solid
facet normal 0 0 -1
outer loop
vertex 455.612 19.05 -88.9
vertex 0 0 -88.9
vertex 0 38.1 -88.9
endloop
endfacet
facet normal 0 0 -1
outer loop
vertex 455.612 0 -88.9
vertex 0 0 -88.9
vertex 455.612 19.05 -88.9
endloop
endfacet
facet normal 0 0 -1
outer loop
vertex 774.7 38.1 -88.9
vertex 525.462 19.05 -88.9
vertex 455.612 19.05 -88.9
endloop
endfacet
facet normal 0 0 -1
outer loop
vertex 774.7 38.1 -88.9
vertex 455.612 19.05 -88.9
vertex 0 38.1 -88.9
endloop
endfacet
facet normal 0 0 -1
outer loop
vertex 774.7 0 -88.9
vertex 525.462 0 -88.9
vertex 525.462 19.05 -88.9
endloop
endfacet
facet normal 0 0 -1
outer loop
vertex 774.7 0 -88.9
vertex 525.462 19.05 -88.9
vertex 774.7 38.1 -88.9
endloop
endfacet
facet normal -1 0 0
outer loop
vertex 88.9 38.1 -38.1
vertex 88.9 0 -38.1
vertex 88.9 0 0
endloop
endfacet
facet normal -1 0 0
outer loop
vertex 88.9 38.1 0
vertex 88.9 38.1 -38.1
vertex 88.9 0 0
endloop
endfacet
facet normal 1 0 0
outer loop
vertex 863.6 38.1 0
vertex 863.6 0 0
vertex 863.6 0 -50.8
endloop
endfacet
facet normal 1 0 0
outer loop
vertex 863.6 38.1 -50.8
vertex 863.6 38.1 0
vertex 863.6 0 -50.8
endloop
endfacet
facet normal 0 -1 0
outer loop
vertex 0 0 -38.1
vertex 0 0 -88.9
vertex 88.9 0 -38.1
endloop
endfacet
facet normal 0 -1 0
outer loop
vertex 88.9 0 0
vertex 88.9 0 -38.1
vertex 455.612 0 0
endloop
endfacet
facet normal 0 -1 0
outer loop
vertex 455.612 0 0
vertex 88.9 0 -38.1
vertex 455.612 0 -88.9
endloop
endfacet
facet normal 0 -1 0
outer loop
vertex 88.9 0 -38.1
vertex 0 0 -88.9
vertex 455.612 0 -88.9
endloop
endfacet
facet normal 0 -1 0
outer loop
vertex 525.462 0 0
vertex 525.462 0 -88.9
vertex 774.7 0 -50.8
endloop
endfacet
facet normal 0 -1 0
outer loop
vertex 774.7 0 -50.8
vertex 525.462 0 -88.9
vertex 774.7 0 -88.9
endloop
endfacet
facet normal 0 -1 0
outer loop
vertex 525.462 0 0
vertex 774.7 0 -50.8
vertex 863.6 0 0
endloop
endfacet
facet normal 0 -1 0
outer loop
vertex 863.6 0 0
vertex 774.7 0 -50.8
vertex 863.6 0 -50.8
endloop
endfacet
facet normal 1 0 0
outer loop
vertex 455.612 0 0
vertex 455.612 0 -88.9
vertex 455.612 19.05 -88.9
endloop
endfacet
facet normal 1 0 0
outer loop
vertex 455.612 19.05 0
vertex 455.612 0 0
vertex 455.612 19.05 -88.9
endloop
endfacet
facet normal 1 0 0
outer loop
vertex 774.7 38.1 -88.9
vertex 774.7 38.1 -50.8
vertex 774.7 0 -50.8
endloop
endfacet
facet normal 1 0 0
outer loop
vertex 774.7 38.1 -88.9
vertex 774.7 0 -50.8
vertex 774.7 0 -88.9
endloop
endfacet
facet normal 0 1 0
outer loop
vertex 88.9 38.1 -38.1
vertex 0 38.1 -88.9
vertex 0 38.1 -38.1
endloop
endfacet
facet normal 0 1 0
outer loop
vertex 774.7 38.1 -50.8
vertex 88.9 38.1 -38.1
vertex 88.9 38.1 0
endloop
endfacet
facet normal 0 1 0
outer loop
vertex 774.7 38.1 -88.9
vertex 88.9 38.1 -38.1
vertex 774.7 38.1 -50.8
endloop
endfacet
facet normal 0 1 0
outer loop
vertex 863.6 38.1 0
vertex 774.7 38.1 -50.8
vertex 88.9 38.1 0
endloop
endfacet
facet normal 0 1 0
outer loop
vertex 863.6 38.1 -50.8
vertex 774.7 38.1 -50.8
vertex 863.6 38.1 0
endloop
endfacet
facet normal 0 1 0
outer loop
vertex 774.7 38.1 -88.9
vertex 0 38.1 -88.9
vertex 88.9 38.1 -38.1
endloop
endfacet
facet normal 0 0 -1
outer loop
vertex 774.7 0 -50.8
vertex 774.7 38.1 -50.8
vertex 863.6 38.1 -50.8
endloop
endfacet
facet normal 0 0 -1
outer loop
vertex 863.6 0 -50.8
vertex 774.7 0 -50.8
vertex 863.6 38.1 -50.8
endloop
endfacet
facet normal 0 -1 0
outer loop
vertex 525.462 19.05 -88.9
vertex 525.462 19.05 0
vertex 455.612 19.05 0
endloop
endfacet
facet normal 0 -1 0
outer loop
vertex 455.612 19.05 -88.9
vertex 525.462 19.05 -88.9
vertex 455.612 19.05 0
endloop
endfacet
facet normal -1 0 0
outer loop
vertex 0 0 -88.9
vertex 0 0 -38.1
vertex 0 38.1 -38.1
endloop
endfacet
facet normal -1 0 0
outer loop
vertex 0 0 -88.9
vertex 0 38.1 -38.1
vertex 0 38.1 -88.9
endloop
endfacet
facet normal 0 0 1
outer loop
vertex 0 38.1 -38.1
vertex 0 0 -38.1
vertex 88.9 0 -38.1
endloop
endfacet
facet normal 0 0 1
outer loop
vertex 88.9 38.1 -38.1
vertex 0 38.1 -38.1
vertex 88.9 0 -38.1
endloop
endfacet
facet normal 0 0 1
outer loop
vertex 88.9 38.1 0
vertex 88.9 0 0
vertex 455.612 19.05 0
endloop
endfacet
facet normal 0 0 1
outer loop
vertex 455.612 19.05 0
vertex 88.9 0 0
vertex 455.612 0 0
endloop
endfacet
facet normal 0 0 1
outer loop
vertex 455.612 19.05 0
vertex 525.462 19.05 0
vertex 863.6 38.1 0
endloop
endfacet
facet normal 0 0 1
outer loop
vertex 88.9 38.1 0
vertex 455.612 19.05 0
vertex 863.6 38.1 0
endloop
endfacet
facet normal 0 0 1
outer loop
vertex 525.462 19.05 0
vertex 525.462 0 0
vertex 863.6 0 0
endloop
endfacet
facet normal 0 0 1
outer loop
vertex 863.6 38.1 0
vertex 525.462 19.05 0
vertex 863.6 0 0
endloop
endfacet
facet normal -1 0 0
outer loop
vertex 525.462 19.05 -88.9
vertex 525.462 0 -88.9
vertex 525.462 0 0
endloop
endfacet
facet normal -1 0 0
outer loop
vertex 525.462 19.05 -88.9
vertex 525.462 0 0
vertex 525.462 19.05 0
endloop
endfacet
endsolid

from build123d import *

# Parameters (mm, degrees)
SKETCH1_W           = 863.6
SKETCH1_H           = 88.9
BOSS_EXTRUDE1_DEPTH = 38.1
SKETCH3_W           = 88.9
SKETCH3_H           = 38.1
CUT_EXTRUDE2_DEPTH  = 39.1
SKETCH4_W           = 69.85
SKETCH4_H           = 19.05
CUT_EXTRUDE3_DEPTH  = 89.9
SKETCH5_W           = 88.9
SKETCH5_H           = 38.1
CUT_EXTRUDE4_DEPTH  = 39.1


with BuildPart() as part:
    # Sketch1 → Boss-Extrude1 (new body)
    with BuildSketch(Plane(origin=(0, 0, 0), x_dir=(1, 0, 0), z_dir=(0, 1, 0))):
        with Locations((431.8, 44.45)):
            Rectangle(SKETCH1_W, SKETCH1_H)
    extrude(amount=BOSS_EXTRUDE1_DEPTH)

    # Sketch3 → Cut-Extrude2 (cut, through all)
    with BuildSketch(Plane(origin=(0, 38.1, 0), x_dir=(1, 0, 0), z_dir=(0, 1, 0))):
        with Locations((819.15, 69.85)):
            Rectangle(SKETCH3_W, SKETCH3_H)
    extrude(amount=-CUT_EXTRUDE2_DEPTH, mode=Mode.SUBTRACT)

    # Sketch4 → Cut-Extrude3 (cut, through all)
    with BuildSketch(Plane(origin=(0, 0, -88.9), x_dir=(-1, 0, 0), z_dir=(0, 0, -1))):
        with Locations((-490.5375, 9.525)):
            Rectangle(SKETCH4_W, SKETCH4_H)
    extrude(amount=-CUT_EXTRUDE3_DEPTH, mode=Mode.SUBTRACT)

    # Sketch5 → Cut-Extrude4 (cut, through all)
    with BuildSketch(Plane.XZ):
        with Locations((44.45, -19.05)):
            Rectangle(SKETCH5_W, SKETCH5_H)
    extrude(amount=-CUT_EXTRUDE4_DEPTH, mode=Mode.SUBTRACT)


solid = part.part
